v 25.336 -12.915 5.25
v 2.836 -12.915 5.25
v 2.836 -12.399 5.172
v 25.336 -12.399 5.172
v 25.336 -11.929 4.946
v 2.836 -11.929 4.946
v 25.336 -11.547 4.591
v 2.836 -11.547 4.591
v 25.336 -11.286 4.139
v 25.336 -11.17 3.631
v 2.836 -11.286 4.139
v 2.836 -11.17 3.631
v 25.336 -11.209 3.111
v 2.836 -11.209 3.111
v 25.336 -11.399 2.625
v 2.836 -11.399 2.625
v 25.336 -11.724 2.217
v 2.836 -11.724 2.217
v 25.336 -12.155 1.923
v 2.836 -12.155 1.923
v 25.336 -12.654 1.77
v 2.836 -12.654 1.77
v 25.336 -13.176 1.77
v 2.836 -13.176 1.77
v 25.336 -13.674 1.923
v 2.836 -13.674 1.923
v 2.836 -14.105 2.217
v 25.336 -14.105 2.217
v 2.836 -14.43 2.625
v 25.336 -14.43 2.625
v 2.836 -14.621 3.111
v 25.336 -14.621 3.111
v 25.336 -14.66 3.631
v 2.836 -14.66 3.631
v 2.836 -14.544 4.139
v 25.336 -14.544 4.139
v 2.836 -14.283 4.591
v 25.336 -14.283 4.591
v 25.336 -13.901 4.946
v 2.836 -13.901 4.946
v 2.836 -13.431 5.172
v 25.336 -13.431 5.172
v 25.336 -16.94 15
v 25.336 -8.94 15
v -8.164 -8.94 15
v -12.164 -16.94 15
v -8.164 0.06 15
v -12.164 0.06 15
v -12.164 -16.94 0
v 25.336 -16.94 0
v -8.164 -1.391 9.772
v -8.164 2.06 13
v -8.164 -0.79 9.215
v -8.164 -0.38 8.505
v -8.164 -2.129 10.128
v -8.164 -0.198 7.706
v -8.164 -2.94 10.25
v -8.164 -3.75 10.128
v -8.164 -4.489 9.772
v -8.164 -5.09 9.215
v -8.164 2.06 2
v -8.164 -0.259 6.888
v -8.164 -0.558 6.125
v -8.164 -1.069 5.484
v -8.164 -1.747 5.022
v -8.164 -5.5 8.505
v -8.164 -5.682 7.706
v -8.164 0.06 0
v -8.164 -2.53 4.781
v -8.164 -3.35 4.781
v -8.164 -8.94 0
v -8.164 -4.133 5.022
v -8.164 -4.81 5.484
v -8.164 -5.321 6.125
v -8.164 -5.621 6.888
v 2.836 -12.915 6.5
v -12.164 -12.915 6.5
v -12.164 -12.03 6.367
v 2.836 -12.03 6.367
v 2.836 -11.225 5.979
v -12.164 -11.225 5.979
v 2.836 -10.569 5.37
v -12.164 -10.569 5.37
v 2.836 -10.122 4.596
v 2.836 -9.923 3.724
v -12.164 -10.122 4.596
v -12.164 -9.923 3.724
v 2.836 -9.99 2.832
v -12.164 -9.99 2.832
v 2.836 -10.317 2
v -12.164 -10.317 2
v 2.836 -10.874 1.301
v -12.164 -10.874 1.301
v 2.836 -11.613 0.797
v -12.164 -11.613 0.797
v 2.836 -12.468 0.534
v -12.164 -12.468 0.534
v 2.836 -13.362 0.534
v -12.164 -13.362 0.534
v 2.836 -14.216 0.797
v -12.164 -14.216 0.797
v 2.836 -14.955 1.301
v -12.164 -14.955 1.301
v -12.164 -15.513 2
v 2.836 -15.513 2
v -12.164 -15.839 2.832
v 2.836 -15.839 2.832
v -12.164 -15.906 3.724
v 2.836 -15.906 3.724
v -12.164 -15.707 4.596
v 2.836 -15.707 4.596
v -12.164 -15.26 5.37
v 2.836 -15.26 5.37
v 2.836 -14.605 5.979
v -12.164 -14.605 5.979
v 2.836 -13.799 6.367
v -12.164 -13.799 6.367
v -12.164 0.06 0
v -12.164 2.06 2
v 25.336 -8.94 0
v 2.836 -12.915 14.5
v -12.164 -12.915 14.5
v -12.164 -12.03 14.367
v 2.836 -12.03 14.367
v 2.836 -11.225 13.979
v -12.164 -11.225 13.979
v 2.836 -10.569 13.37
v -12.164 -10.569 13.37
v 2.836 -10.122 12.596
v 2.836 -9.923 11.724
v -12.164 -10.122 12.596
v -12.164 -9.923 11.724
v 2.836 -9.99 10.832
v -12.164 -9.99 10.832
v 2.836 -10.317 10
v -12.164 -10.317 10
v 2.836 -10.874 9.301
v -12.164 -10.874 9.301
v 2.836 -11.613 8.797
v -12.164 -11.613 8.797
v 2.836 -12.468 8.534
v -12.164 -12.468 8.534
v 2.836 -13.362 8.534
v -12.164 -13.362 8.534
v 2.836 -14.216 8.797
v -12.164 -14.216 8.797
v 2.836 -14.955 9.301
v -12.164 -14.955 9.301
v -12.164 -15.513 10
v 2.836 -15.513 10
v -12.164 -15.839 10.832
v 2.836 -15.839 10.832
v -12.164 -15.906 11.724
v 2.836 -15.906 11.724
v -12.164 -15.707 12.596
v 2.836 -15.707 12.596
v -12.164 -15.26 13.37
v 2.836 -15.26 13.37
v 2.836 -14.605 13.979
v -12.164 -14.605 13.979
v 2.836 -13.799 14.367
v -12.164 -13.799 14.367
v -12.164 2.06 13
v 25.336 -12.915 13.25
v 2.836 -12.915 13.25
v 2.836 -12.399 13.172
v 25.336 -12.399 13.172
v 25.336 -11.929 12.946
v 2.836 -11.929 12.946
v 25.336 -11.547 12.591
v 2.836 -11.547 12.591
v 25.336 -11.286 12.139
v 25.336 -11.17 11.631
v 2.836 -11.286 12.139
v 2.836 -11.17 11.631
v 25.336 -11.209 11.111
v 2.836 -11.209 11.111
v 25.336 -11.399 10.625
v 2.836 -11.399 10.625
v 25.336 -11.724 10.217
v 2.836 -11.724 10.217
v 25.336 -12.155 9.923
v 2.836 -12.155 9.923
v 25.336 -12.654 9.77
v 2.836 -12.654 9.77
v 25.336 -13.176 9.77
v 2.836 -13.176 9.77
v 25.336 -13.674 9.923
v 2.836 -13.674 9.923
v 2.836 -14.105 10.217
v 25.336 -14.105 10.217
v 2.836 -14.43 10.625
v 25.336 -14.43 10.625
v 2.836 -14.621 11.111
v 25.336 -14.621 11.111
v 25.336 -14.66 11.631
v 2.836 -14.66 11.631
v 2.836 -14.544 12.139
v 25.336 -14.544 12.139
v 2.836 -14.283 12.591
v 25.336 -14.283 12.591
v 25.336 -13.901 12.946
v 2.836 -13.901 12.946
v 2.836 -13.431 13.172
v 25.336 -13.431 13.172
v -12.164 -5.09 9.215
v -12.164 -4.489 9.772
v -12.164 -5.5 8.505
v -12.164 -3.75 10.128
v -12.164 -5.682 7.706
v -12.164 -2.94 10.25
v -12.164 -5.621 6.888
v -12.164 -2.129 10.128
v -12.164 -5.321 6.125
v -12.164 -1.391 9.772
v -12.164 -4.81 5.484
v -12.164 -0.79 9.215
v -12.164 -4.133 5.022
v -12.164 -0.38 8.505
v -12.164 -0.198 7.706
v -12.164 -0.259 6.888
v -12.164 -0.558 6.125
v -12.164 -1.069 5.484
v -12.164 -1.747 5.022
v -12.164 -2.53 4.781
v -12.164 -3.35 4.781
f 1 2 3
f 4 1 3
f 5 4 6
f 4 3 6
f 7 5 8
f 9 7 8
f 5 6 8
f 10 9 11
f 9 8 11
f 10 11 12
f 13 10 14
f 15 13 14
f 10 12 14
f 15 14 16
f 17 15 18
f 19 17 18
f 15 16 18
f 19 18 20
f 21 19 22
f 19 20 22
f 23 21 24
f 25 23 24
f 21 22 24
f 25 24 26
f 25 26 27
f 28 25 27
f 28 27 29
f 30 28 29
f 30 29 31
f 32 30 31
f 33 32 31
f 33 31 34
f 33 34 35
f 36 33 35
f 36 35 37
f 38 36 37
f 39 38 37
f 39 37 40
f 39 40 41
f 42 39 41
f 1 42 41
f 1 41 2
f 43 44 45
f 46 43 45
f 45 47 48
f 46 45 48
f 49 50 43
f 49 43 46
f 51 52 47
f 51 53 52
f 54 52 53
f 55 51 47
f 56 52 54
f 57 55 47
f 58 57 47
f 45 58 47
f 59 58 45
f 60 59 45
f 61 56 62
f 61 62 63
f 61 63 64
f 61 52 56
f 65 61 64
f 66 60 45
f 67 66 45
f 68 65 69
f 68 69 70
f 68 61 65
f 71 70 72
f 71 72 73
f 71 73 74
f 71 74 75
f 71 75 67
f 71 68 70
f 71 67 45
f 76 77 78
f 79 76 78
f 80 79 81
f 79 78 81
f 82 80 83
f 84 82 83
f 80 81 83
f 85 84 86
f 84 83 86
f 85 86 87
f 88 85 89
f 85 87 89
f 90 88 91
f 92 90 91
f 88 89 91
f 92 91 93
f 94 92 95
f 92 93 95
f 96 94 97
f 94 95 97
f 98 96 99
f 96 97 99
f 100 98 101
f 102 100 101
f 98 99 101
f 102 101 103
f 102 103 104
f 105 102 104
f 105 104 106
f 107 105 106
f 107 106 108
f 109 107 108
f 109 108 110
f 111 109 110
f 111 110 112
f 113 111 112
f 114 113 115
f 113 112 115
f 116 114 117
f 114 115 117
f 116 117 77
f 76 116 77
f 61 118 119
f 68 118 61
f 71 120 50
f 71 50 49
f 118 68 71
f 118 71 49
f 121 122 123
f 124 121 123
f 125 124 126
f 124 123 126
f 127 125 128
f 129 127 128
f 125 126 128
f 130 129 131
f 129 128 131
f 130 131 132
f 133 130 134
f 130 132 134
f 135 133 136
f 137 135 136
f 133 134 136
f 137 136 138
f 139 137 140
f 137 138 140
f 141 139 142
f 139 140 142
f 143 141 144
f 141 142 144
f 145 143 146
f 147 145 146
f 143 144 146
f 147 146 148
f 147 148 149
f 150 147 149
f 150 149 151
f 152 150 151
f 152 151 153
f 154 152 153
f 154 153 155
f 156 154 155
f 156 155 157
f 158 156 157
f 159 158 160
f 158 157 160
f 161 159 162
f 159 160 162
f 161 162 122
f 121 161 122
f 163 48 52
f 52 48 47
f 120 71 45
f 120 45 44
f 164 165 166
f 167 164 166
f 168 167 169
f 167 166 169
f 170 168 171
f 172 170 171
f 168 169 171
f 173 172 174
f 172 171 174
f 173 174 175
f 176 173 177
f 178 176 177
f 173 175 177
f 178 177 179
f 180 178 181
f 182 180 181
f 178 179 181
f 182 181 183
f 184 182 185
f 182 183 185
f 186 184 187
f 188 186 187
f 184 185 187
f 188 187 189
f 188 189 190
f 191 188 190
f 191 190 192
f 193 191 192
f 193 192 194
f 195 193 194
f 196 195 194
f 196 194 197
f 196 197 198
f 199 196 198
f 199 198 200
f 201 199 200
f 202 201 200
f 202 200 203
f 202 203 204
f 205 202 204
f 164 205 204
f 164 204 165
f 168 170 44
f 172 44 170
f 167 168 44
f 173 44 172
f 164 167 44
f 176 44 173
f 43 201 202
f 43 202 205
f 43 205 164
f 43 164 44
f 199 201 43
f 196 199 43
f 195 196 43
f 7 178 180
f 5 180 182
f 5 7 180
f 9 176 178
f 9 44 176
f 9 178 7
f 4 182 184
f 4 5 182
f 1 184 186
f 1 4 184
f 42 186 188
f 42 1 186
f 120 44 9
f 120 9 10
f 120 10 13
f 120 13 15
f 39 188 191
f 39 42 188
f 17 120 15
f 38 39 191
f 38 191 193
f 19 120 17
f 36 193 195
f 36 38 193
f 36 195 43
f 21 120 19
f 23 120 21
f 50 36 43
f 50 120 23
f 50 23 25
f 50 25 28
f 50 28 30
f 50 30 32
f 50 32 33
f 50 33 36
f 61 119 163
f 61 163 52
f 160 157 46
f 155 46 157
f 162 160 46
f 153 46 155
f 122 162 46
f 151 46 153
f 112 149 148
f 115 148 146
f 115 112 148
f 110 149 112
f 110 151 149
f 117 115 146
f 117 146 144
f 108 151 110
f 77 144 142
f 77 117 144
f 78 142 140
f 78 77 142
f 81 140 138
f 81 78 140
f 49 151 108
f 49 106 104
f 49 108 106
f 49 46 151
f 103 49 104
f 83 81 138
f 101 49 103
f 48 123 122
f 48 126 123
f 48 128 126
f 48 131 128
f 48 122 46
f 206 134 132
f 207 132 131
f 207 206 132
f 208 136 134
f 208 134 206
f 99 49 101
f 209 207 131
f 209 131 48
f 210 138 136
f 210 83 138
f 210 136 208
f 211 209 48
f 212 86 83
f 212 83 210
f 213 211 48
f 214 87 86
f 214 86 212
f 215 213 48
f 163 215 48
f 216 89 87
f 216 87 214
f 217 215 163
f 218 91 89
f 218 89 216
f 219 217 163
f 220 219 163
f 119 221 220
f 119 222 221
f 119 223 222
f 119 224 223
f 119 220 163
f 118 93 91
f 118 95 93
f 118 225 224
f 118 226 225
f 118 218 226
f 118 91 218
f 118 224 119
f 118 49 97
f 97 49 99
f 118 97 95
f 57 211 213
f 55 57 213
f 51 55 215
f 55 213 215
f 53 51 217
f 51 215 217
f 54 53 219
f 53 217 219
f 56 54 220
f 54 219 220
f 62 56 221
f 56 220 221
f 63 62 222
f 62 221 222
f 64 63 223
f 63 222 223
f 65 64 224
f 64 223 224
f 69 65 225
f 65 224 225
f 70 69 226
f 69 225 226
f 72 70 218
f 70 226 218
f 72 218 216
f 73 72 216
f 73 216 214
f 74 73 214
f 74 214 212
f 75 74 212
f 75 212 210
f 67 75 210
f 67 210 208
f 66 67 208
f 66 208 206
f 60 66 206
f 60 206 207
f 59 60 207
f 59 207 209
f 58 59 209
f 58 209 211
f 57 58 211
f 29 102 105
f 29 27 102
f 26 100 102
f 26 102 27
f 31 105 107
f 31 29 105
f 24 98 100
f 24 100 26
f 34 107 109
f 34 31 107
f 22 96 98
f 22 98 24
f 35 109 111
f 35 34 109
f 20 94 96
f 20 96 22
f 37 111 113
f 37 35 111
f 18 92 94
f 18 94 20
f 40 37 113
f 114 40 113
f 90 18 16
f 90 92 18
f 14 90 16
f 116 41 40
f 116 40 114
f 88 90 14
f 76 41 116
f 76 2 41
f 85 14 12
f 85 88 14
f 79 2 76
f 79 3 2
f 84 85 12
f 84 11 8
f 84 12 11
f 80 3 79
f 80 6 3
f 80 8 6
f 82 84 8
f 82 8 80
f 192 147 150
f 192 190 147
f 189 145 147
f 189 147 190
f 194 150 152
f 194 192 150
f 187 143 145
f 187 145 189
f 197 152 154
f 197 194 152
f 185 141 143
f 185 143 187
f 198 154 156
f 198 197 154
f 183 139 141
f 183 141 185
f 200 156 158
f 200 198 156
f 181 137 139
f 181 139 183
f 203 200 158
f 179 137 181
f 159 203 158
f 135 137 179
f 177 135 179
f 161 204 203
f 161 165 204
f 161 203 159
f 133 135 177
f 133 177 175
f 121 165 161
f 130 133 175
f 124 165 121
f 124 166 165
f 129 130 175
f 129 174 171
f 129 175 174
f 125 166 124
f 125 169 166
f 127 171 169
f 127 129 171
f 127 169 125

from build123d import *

# Parameters (mm, degrees)
BOSS_EXTRUDE1_DEPTH = 15
SKETCH2_R           = 2.75
SKETCH2_R_2         = 3
SKETCH2_R_3         = 1.75
CUT_EXTRUDE1_DEPTH  = 15
SKETCH3_R           = 1.75
CUT_EXTRUDE2_DEPTH  = 38.5
CHAMFER1_SIZE       = 2


with BuildPart() as part:
    # Sketch1 → Boss-Extrude1 (new body)
    with BuildSketch(Plane.XY):
        Polygon((-12.163709917, 2.060150376), (-8.163709917, 2.060150376), (-8.163709917, -8.939849624), (25.336290083, -8.939849624), (25.336290083, -16.939849624), (-12.163709917, -16.939849624), align=None)
    extrude(amount=BOSS_EXTRUDE1_DEPTH)

    # Sketch2 → Cut-Extrude1 (cut)
    with BuildSketch(Plane.ZY.offset(12.163709917)):
        with Locations((7.5, -2.939849624)):
            Circle(SKETCH2_R)
        with Locations((11.5, -12.914706032)):
            Circle(SKETCH2_R_2)
        with Locations((11.5, -12.914706032)):
            Circle(SKETCH2_R_3, mode=Mode.SUBTRACT)
        with Locations((3.5, -12.914706032)):
            Circle(SKETCH2_R_2)
        with Locations((3.5, -12.914706032)):
            Circle(SKETCH2_R_3, mode=Mode.SUBTRACT)
    extrude(amount=-CUT_EXTRUDE1_DEPTH, mode=Mode.SUBTRACT)

    # Sketch3 → Cut-Extrude2 (cut, through all)
    with BuildSketch(Plane.ZY.offset(12.163709917)):
        with Locations((3.5, -12.914706032)):
            Circle(SKETCH3_R)
        with Locations((11.5, -12.914706032)):
            Circle(SKETCH3_R)
    extrude(amount=-CUT_EXTRUDE2_DEPTH, mode=Mode.SUBTRACT)

    # Chamfer1
    chamfer1_edges = [part.edges().sort_by_distance(p)[0] for p in [
        (-10.163709917, 2.060150376, 15),
        (-10.163709917, 2.060150376, 0),
    ]]
    chamfer(chamfer1_edges, length=CHAMFER1_SIZE)


solid = part.part
